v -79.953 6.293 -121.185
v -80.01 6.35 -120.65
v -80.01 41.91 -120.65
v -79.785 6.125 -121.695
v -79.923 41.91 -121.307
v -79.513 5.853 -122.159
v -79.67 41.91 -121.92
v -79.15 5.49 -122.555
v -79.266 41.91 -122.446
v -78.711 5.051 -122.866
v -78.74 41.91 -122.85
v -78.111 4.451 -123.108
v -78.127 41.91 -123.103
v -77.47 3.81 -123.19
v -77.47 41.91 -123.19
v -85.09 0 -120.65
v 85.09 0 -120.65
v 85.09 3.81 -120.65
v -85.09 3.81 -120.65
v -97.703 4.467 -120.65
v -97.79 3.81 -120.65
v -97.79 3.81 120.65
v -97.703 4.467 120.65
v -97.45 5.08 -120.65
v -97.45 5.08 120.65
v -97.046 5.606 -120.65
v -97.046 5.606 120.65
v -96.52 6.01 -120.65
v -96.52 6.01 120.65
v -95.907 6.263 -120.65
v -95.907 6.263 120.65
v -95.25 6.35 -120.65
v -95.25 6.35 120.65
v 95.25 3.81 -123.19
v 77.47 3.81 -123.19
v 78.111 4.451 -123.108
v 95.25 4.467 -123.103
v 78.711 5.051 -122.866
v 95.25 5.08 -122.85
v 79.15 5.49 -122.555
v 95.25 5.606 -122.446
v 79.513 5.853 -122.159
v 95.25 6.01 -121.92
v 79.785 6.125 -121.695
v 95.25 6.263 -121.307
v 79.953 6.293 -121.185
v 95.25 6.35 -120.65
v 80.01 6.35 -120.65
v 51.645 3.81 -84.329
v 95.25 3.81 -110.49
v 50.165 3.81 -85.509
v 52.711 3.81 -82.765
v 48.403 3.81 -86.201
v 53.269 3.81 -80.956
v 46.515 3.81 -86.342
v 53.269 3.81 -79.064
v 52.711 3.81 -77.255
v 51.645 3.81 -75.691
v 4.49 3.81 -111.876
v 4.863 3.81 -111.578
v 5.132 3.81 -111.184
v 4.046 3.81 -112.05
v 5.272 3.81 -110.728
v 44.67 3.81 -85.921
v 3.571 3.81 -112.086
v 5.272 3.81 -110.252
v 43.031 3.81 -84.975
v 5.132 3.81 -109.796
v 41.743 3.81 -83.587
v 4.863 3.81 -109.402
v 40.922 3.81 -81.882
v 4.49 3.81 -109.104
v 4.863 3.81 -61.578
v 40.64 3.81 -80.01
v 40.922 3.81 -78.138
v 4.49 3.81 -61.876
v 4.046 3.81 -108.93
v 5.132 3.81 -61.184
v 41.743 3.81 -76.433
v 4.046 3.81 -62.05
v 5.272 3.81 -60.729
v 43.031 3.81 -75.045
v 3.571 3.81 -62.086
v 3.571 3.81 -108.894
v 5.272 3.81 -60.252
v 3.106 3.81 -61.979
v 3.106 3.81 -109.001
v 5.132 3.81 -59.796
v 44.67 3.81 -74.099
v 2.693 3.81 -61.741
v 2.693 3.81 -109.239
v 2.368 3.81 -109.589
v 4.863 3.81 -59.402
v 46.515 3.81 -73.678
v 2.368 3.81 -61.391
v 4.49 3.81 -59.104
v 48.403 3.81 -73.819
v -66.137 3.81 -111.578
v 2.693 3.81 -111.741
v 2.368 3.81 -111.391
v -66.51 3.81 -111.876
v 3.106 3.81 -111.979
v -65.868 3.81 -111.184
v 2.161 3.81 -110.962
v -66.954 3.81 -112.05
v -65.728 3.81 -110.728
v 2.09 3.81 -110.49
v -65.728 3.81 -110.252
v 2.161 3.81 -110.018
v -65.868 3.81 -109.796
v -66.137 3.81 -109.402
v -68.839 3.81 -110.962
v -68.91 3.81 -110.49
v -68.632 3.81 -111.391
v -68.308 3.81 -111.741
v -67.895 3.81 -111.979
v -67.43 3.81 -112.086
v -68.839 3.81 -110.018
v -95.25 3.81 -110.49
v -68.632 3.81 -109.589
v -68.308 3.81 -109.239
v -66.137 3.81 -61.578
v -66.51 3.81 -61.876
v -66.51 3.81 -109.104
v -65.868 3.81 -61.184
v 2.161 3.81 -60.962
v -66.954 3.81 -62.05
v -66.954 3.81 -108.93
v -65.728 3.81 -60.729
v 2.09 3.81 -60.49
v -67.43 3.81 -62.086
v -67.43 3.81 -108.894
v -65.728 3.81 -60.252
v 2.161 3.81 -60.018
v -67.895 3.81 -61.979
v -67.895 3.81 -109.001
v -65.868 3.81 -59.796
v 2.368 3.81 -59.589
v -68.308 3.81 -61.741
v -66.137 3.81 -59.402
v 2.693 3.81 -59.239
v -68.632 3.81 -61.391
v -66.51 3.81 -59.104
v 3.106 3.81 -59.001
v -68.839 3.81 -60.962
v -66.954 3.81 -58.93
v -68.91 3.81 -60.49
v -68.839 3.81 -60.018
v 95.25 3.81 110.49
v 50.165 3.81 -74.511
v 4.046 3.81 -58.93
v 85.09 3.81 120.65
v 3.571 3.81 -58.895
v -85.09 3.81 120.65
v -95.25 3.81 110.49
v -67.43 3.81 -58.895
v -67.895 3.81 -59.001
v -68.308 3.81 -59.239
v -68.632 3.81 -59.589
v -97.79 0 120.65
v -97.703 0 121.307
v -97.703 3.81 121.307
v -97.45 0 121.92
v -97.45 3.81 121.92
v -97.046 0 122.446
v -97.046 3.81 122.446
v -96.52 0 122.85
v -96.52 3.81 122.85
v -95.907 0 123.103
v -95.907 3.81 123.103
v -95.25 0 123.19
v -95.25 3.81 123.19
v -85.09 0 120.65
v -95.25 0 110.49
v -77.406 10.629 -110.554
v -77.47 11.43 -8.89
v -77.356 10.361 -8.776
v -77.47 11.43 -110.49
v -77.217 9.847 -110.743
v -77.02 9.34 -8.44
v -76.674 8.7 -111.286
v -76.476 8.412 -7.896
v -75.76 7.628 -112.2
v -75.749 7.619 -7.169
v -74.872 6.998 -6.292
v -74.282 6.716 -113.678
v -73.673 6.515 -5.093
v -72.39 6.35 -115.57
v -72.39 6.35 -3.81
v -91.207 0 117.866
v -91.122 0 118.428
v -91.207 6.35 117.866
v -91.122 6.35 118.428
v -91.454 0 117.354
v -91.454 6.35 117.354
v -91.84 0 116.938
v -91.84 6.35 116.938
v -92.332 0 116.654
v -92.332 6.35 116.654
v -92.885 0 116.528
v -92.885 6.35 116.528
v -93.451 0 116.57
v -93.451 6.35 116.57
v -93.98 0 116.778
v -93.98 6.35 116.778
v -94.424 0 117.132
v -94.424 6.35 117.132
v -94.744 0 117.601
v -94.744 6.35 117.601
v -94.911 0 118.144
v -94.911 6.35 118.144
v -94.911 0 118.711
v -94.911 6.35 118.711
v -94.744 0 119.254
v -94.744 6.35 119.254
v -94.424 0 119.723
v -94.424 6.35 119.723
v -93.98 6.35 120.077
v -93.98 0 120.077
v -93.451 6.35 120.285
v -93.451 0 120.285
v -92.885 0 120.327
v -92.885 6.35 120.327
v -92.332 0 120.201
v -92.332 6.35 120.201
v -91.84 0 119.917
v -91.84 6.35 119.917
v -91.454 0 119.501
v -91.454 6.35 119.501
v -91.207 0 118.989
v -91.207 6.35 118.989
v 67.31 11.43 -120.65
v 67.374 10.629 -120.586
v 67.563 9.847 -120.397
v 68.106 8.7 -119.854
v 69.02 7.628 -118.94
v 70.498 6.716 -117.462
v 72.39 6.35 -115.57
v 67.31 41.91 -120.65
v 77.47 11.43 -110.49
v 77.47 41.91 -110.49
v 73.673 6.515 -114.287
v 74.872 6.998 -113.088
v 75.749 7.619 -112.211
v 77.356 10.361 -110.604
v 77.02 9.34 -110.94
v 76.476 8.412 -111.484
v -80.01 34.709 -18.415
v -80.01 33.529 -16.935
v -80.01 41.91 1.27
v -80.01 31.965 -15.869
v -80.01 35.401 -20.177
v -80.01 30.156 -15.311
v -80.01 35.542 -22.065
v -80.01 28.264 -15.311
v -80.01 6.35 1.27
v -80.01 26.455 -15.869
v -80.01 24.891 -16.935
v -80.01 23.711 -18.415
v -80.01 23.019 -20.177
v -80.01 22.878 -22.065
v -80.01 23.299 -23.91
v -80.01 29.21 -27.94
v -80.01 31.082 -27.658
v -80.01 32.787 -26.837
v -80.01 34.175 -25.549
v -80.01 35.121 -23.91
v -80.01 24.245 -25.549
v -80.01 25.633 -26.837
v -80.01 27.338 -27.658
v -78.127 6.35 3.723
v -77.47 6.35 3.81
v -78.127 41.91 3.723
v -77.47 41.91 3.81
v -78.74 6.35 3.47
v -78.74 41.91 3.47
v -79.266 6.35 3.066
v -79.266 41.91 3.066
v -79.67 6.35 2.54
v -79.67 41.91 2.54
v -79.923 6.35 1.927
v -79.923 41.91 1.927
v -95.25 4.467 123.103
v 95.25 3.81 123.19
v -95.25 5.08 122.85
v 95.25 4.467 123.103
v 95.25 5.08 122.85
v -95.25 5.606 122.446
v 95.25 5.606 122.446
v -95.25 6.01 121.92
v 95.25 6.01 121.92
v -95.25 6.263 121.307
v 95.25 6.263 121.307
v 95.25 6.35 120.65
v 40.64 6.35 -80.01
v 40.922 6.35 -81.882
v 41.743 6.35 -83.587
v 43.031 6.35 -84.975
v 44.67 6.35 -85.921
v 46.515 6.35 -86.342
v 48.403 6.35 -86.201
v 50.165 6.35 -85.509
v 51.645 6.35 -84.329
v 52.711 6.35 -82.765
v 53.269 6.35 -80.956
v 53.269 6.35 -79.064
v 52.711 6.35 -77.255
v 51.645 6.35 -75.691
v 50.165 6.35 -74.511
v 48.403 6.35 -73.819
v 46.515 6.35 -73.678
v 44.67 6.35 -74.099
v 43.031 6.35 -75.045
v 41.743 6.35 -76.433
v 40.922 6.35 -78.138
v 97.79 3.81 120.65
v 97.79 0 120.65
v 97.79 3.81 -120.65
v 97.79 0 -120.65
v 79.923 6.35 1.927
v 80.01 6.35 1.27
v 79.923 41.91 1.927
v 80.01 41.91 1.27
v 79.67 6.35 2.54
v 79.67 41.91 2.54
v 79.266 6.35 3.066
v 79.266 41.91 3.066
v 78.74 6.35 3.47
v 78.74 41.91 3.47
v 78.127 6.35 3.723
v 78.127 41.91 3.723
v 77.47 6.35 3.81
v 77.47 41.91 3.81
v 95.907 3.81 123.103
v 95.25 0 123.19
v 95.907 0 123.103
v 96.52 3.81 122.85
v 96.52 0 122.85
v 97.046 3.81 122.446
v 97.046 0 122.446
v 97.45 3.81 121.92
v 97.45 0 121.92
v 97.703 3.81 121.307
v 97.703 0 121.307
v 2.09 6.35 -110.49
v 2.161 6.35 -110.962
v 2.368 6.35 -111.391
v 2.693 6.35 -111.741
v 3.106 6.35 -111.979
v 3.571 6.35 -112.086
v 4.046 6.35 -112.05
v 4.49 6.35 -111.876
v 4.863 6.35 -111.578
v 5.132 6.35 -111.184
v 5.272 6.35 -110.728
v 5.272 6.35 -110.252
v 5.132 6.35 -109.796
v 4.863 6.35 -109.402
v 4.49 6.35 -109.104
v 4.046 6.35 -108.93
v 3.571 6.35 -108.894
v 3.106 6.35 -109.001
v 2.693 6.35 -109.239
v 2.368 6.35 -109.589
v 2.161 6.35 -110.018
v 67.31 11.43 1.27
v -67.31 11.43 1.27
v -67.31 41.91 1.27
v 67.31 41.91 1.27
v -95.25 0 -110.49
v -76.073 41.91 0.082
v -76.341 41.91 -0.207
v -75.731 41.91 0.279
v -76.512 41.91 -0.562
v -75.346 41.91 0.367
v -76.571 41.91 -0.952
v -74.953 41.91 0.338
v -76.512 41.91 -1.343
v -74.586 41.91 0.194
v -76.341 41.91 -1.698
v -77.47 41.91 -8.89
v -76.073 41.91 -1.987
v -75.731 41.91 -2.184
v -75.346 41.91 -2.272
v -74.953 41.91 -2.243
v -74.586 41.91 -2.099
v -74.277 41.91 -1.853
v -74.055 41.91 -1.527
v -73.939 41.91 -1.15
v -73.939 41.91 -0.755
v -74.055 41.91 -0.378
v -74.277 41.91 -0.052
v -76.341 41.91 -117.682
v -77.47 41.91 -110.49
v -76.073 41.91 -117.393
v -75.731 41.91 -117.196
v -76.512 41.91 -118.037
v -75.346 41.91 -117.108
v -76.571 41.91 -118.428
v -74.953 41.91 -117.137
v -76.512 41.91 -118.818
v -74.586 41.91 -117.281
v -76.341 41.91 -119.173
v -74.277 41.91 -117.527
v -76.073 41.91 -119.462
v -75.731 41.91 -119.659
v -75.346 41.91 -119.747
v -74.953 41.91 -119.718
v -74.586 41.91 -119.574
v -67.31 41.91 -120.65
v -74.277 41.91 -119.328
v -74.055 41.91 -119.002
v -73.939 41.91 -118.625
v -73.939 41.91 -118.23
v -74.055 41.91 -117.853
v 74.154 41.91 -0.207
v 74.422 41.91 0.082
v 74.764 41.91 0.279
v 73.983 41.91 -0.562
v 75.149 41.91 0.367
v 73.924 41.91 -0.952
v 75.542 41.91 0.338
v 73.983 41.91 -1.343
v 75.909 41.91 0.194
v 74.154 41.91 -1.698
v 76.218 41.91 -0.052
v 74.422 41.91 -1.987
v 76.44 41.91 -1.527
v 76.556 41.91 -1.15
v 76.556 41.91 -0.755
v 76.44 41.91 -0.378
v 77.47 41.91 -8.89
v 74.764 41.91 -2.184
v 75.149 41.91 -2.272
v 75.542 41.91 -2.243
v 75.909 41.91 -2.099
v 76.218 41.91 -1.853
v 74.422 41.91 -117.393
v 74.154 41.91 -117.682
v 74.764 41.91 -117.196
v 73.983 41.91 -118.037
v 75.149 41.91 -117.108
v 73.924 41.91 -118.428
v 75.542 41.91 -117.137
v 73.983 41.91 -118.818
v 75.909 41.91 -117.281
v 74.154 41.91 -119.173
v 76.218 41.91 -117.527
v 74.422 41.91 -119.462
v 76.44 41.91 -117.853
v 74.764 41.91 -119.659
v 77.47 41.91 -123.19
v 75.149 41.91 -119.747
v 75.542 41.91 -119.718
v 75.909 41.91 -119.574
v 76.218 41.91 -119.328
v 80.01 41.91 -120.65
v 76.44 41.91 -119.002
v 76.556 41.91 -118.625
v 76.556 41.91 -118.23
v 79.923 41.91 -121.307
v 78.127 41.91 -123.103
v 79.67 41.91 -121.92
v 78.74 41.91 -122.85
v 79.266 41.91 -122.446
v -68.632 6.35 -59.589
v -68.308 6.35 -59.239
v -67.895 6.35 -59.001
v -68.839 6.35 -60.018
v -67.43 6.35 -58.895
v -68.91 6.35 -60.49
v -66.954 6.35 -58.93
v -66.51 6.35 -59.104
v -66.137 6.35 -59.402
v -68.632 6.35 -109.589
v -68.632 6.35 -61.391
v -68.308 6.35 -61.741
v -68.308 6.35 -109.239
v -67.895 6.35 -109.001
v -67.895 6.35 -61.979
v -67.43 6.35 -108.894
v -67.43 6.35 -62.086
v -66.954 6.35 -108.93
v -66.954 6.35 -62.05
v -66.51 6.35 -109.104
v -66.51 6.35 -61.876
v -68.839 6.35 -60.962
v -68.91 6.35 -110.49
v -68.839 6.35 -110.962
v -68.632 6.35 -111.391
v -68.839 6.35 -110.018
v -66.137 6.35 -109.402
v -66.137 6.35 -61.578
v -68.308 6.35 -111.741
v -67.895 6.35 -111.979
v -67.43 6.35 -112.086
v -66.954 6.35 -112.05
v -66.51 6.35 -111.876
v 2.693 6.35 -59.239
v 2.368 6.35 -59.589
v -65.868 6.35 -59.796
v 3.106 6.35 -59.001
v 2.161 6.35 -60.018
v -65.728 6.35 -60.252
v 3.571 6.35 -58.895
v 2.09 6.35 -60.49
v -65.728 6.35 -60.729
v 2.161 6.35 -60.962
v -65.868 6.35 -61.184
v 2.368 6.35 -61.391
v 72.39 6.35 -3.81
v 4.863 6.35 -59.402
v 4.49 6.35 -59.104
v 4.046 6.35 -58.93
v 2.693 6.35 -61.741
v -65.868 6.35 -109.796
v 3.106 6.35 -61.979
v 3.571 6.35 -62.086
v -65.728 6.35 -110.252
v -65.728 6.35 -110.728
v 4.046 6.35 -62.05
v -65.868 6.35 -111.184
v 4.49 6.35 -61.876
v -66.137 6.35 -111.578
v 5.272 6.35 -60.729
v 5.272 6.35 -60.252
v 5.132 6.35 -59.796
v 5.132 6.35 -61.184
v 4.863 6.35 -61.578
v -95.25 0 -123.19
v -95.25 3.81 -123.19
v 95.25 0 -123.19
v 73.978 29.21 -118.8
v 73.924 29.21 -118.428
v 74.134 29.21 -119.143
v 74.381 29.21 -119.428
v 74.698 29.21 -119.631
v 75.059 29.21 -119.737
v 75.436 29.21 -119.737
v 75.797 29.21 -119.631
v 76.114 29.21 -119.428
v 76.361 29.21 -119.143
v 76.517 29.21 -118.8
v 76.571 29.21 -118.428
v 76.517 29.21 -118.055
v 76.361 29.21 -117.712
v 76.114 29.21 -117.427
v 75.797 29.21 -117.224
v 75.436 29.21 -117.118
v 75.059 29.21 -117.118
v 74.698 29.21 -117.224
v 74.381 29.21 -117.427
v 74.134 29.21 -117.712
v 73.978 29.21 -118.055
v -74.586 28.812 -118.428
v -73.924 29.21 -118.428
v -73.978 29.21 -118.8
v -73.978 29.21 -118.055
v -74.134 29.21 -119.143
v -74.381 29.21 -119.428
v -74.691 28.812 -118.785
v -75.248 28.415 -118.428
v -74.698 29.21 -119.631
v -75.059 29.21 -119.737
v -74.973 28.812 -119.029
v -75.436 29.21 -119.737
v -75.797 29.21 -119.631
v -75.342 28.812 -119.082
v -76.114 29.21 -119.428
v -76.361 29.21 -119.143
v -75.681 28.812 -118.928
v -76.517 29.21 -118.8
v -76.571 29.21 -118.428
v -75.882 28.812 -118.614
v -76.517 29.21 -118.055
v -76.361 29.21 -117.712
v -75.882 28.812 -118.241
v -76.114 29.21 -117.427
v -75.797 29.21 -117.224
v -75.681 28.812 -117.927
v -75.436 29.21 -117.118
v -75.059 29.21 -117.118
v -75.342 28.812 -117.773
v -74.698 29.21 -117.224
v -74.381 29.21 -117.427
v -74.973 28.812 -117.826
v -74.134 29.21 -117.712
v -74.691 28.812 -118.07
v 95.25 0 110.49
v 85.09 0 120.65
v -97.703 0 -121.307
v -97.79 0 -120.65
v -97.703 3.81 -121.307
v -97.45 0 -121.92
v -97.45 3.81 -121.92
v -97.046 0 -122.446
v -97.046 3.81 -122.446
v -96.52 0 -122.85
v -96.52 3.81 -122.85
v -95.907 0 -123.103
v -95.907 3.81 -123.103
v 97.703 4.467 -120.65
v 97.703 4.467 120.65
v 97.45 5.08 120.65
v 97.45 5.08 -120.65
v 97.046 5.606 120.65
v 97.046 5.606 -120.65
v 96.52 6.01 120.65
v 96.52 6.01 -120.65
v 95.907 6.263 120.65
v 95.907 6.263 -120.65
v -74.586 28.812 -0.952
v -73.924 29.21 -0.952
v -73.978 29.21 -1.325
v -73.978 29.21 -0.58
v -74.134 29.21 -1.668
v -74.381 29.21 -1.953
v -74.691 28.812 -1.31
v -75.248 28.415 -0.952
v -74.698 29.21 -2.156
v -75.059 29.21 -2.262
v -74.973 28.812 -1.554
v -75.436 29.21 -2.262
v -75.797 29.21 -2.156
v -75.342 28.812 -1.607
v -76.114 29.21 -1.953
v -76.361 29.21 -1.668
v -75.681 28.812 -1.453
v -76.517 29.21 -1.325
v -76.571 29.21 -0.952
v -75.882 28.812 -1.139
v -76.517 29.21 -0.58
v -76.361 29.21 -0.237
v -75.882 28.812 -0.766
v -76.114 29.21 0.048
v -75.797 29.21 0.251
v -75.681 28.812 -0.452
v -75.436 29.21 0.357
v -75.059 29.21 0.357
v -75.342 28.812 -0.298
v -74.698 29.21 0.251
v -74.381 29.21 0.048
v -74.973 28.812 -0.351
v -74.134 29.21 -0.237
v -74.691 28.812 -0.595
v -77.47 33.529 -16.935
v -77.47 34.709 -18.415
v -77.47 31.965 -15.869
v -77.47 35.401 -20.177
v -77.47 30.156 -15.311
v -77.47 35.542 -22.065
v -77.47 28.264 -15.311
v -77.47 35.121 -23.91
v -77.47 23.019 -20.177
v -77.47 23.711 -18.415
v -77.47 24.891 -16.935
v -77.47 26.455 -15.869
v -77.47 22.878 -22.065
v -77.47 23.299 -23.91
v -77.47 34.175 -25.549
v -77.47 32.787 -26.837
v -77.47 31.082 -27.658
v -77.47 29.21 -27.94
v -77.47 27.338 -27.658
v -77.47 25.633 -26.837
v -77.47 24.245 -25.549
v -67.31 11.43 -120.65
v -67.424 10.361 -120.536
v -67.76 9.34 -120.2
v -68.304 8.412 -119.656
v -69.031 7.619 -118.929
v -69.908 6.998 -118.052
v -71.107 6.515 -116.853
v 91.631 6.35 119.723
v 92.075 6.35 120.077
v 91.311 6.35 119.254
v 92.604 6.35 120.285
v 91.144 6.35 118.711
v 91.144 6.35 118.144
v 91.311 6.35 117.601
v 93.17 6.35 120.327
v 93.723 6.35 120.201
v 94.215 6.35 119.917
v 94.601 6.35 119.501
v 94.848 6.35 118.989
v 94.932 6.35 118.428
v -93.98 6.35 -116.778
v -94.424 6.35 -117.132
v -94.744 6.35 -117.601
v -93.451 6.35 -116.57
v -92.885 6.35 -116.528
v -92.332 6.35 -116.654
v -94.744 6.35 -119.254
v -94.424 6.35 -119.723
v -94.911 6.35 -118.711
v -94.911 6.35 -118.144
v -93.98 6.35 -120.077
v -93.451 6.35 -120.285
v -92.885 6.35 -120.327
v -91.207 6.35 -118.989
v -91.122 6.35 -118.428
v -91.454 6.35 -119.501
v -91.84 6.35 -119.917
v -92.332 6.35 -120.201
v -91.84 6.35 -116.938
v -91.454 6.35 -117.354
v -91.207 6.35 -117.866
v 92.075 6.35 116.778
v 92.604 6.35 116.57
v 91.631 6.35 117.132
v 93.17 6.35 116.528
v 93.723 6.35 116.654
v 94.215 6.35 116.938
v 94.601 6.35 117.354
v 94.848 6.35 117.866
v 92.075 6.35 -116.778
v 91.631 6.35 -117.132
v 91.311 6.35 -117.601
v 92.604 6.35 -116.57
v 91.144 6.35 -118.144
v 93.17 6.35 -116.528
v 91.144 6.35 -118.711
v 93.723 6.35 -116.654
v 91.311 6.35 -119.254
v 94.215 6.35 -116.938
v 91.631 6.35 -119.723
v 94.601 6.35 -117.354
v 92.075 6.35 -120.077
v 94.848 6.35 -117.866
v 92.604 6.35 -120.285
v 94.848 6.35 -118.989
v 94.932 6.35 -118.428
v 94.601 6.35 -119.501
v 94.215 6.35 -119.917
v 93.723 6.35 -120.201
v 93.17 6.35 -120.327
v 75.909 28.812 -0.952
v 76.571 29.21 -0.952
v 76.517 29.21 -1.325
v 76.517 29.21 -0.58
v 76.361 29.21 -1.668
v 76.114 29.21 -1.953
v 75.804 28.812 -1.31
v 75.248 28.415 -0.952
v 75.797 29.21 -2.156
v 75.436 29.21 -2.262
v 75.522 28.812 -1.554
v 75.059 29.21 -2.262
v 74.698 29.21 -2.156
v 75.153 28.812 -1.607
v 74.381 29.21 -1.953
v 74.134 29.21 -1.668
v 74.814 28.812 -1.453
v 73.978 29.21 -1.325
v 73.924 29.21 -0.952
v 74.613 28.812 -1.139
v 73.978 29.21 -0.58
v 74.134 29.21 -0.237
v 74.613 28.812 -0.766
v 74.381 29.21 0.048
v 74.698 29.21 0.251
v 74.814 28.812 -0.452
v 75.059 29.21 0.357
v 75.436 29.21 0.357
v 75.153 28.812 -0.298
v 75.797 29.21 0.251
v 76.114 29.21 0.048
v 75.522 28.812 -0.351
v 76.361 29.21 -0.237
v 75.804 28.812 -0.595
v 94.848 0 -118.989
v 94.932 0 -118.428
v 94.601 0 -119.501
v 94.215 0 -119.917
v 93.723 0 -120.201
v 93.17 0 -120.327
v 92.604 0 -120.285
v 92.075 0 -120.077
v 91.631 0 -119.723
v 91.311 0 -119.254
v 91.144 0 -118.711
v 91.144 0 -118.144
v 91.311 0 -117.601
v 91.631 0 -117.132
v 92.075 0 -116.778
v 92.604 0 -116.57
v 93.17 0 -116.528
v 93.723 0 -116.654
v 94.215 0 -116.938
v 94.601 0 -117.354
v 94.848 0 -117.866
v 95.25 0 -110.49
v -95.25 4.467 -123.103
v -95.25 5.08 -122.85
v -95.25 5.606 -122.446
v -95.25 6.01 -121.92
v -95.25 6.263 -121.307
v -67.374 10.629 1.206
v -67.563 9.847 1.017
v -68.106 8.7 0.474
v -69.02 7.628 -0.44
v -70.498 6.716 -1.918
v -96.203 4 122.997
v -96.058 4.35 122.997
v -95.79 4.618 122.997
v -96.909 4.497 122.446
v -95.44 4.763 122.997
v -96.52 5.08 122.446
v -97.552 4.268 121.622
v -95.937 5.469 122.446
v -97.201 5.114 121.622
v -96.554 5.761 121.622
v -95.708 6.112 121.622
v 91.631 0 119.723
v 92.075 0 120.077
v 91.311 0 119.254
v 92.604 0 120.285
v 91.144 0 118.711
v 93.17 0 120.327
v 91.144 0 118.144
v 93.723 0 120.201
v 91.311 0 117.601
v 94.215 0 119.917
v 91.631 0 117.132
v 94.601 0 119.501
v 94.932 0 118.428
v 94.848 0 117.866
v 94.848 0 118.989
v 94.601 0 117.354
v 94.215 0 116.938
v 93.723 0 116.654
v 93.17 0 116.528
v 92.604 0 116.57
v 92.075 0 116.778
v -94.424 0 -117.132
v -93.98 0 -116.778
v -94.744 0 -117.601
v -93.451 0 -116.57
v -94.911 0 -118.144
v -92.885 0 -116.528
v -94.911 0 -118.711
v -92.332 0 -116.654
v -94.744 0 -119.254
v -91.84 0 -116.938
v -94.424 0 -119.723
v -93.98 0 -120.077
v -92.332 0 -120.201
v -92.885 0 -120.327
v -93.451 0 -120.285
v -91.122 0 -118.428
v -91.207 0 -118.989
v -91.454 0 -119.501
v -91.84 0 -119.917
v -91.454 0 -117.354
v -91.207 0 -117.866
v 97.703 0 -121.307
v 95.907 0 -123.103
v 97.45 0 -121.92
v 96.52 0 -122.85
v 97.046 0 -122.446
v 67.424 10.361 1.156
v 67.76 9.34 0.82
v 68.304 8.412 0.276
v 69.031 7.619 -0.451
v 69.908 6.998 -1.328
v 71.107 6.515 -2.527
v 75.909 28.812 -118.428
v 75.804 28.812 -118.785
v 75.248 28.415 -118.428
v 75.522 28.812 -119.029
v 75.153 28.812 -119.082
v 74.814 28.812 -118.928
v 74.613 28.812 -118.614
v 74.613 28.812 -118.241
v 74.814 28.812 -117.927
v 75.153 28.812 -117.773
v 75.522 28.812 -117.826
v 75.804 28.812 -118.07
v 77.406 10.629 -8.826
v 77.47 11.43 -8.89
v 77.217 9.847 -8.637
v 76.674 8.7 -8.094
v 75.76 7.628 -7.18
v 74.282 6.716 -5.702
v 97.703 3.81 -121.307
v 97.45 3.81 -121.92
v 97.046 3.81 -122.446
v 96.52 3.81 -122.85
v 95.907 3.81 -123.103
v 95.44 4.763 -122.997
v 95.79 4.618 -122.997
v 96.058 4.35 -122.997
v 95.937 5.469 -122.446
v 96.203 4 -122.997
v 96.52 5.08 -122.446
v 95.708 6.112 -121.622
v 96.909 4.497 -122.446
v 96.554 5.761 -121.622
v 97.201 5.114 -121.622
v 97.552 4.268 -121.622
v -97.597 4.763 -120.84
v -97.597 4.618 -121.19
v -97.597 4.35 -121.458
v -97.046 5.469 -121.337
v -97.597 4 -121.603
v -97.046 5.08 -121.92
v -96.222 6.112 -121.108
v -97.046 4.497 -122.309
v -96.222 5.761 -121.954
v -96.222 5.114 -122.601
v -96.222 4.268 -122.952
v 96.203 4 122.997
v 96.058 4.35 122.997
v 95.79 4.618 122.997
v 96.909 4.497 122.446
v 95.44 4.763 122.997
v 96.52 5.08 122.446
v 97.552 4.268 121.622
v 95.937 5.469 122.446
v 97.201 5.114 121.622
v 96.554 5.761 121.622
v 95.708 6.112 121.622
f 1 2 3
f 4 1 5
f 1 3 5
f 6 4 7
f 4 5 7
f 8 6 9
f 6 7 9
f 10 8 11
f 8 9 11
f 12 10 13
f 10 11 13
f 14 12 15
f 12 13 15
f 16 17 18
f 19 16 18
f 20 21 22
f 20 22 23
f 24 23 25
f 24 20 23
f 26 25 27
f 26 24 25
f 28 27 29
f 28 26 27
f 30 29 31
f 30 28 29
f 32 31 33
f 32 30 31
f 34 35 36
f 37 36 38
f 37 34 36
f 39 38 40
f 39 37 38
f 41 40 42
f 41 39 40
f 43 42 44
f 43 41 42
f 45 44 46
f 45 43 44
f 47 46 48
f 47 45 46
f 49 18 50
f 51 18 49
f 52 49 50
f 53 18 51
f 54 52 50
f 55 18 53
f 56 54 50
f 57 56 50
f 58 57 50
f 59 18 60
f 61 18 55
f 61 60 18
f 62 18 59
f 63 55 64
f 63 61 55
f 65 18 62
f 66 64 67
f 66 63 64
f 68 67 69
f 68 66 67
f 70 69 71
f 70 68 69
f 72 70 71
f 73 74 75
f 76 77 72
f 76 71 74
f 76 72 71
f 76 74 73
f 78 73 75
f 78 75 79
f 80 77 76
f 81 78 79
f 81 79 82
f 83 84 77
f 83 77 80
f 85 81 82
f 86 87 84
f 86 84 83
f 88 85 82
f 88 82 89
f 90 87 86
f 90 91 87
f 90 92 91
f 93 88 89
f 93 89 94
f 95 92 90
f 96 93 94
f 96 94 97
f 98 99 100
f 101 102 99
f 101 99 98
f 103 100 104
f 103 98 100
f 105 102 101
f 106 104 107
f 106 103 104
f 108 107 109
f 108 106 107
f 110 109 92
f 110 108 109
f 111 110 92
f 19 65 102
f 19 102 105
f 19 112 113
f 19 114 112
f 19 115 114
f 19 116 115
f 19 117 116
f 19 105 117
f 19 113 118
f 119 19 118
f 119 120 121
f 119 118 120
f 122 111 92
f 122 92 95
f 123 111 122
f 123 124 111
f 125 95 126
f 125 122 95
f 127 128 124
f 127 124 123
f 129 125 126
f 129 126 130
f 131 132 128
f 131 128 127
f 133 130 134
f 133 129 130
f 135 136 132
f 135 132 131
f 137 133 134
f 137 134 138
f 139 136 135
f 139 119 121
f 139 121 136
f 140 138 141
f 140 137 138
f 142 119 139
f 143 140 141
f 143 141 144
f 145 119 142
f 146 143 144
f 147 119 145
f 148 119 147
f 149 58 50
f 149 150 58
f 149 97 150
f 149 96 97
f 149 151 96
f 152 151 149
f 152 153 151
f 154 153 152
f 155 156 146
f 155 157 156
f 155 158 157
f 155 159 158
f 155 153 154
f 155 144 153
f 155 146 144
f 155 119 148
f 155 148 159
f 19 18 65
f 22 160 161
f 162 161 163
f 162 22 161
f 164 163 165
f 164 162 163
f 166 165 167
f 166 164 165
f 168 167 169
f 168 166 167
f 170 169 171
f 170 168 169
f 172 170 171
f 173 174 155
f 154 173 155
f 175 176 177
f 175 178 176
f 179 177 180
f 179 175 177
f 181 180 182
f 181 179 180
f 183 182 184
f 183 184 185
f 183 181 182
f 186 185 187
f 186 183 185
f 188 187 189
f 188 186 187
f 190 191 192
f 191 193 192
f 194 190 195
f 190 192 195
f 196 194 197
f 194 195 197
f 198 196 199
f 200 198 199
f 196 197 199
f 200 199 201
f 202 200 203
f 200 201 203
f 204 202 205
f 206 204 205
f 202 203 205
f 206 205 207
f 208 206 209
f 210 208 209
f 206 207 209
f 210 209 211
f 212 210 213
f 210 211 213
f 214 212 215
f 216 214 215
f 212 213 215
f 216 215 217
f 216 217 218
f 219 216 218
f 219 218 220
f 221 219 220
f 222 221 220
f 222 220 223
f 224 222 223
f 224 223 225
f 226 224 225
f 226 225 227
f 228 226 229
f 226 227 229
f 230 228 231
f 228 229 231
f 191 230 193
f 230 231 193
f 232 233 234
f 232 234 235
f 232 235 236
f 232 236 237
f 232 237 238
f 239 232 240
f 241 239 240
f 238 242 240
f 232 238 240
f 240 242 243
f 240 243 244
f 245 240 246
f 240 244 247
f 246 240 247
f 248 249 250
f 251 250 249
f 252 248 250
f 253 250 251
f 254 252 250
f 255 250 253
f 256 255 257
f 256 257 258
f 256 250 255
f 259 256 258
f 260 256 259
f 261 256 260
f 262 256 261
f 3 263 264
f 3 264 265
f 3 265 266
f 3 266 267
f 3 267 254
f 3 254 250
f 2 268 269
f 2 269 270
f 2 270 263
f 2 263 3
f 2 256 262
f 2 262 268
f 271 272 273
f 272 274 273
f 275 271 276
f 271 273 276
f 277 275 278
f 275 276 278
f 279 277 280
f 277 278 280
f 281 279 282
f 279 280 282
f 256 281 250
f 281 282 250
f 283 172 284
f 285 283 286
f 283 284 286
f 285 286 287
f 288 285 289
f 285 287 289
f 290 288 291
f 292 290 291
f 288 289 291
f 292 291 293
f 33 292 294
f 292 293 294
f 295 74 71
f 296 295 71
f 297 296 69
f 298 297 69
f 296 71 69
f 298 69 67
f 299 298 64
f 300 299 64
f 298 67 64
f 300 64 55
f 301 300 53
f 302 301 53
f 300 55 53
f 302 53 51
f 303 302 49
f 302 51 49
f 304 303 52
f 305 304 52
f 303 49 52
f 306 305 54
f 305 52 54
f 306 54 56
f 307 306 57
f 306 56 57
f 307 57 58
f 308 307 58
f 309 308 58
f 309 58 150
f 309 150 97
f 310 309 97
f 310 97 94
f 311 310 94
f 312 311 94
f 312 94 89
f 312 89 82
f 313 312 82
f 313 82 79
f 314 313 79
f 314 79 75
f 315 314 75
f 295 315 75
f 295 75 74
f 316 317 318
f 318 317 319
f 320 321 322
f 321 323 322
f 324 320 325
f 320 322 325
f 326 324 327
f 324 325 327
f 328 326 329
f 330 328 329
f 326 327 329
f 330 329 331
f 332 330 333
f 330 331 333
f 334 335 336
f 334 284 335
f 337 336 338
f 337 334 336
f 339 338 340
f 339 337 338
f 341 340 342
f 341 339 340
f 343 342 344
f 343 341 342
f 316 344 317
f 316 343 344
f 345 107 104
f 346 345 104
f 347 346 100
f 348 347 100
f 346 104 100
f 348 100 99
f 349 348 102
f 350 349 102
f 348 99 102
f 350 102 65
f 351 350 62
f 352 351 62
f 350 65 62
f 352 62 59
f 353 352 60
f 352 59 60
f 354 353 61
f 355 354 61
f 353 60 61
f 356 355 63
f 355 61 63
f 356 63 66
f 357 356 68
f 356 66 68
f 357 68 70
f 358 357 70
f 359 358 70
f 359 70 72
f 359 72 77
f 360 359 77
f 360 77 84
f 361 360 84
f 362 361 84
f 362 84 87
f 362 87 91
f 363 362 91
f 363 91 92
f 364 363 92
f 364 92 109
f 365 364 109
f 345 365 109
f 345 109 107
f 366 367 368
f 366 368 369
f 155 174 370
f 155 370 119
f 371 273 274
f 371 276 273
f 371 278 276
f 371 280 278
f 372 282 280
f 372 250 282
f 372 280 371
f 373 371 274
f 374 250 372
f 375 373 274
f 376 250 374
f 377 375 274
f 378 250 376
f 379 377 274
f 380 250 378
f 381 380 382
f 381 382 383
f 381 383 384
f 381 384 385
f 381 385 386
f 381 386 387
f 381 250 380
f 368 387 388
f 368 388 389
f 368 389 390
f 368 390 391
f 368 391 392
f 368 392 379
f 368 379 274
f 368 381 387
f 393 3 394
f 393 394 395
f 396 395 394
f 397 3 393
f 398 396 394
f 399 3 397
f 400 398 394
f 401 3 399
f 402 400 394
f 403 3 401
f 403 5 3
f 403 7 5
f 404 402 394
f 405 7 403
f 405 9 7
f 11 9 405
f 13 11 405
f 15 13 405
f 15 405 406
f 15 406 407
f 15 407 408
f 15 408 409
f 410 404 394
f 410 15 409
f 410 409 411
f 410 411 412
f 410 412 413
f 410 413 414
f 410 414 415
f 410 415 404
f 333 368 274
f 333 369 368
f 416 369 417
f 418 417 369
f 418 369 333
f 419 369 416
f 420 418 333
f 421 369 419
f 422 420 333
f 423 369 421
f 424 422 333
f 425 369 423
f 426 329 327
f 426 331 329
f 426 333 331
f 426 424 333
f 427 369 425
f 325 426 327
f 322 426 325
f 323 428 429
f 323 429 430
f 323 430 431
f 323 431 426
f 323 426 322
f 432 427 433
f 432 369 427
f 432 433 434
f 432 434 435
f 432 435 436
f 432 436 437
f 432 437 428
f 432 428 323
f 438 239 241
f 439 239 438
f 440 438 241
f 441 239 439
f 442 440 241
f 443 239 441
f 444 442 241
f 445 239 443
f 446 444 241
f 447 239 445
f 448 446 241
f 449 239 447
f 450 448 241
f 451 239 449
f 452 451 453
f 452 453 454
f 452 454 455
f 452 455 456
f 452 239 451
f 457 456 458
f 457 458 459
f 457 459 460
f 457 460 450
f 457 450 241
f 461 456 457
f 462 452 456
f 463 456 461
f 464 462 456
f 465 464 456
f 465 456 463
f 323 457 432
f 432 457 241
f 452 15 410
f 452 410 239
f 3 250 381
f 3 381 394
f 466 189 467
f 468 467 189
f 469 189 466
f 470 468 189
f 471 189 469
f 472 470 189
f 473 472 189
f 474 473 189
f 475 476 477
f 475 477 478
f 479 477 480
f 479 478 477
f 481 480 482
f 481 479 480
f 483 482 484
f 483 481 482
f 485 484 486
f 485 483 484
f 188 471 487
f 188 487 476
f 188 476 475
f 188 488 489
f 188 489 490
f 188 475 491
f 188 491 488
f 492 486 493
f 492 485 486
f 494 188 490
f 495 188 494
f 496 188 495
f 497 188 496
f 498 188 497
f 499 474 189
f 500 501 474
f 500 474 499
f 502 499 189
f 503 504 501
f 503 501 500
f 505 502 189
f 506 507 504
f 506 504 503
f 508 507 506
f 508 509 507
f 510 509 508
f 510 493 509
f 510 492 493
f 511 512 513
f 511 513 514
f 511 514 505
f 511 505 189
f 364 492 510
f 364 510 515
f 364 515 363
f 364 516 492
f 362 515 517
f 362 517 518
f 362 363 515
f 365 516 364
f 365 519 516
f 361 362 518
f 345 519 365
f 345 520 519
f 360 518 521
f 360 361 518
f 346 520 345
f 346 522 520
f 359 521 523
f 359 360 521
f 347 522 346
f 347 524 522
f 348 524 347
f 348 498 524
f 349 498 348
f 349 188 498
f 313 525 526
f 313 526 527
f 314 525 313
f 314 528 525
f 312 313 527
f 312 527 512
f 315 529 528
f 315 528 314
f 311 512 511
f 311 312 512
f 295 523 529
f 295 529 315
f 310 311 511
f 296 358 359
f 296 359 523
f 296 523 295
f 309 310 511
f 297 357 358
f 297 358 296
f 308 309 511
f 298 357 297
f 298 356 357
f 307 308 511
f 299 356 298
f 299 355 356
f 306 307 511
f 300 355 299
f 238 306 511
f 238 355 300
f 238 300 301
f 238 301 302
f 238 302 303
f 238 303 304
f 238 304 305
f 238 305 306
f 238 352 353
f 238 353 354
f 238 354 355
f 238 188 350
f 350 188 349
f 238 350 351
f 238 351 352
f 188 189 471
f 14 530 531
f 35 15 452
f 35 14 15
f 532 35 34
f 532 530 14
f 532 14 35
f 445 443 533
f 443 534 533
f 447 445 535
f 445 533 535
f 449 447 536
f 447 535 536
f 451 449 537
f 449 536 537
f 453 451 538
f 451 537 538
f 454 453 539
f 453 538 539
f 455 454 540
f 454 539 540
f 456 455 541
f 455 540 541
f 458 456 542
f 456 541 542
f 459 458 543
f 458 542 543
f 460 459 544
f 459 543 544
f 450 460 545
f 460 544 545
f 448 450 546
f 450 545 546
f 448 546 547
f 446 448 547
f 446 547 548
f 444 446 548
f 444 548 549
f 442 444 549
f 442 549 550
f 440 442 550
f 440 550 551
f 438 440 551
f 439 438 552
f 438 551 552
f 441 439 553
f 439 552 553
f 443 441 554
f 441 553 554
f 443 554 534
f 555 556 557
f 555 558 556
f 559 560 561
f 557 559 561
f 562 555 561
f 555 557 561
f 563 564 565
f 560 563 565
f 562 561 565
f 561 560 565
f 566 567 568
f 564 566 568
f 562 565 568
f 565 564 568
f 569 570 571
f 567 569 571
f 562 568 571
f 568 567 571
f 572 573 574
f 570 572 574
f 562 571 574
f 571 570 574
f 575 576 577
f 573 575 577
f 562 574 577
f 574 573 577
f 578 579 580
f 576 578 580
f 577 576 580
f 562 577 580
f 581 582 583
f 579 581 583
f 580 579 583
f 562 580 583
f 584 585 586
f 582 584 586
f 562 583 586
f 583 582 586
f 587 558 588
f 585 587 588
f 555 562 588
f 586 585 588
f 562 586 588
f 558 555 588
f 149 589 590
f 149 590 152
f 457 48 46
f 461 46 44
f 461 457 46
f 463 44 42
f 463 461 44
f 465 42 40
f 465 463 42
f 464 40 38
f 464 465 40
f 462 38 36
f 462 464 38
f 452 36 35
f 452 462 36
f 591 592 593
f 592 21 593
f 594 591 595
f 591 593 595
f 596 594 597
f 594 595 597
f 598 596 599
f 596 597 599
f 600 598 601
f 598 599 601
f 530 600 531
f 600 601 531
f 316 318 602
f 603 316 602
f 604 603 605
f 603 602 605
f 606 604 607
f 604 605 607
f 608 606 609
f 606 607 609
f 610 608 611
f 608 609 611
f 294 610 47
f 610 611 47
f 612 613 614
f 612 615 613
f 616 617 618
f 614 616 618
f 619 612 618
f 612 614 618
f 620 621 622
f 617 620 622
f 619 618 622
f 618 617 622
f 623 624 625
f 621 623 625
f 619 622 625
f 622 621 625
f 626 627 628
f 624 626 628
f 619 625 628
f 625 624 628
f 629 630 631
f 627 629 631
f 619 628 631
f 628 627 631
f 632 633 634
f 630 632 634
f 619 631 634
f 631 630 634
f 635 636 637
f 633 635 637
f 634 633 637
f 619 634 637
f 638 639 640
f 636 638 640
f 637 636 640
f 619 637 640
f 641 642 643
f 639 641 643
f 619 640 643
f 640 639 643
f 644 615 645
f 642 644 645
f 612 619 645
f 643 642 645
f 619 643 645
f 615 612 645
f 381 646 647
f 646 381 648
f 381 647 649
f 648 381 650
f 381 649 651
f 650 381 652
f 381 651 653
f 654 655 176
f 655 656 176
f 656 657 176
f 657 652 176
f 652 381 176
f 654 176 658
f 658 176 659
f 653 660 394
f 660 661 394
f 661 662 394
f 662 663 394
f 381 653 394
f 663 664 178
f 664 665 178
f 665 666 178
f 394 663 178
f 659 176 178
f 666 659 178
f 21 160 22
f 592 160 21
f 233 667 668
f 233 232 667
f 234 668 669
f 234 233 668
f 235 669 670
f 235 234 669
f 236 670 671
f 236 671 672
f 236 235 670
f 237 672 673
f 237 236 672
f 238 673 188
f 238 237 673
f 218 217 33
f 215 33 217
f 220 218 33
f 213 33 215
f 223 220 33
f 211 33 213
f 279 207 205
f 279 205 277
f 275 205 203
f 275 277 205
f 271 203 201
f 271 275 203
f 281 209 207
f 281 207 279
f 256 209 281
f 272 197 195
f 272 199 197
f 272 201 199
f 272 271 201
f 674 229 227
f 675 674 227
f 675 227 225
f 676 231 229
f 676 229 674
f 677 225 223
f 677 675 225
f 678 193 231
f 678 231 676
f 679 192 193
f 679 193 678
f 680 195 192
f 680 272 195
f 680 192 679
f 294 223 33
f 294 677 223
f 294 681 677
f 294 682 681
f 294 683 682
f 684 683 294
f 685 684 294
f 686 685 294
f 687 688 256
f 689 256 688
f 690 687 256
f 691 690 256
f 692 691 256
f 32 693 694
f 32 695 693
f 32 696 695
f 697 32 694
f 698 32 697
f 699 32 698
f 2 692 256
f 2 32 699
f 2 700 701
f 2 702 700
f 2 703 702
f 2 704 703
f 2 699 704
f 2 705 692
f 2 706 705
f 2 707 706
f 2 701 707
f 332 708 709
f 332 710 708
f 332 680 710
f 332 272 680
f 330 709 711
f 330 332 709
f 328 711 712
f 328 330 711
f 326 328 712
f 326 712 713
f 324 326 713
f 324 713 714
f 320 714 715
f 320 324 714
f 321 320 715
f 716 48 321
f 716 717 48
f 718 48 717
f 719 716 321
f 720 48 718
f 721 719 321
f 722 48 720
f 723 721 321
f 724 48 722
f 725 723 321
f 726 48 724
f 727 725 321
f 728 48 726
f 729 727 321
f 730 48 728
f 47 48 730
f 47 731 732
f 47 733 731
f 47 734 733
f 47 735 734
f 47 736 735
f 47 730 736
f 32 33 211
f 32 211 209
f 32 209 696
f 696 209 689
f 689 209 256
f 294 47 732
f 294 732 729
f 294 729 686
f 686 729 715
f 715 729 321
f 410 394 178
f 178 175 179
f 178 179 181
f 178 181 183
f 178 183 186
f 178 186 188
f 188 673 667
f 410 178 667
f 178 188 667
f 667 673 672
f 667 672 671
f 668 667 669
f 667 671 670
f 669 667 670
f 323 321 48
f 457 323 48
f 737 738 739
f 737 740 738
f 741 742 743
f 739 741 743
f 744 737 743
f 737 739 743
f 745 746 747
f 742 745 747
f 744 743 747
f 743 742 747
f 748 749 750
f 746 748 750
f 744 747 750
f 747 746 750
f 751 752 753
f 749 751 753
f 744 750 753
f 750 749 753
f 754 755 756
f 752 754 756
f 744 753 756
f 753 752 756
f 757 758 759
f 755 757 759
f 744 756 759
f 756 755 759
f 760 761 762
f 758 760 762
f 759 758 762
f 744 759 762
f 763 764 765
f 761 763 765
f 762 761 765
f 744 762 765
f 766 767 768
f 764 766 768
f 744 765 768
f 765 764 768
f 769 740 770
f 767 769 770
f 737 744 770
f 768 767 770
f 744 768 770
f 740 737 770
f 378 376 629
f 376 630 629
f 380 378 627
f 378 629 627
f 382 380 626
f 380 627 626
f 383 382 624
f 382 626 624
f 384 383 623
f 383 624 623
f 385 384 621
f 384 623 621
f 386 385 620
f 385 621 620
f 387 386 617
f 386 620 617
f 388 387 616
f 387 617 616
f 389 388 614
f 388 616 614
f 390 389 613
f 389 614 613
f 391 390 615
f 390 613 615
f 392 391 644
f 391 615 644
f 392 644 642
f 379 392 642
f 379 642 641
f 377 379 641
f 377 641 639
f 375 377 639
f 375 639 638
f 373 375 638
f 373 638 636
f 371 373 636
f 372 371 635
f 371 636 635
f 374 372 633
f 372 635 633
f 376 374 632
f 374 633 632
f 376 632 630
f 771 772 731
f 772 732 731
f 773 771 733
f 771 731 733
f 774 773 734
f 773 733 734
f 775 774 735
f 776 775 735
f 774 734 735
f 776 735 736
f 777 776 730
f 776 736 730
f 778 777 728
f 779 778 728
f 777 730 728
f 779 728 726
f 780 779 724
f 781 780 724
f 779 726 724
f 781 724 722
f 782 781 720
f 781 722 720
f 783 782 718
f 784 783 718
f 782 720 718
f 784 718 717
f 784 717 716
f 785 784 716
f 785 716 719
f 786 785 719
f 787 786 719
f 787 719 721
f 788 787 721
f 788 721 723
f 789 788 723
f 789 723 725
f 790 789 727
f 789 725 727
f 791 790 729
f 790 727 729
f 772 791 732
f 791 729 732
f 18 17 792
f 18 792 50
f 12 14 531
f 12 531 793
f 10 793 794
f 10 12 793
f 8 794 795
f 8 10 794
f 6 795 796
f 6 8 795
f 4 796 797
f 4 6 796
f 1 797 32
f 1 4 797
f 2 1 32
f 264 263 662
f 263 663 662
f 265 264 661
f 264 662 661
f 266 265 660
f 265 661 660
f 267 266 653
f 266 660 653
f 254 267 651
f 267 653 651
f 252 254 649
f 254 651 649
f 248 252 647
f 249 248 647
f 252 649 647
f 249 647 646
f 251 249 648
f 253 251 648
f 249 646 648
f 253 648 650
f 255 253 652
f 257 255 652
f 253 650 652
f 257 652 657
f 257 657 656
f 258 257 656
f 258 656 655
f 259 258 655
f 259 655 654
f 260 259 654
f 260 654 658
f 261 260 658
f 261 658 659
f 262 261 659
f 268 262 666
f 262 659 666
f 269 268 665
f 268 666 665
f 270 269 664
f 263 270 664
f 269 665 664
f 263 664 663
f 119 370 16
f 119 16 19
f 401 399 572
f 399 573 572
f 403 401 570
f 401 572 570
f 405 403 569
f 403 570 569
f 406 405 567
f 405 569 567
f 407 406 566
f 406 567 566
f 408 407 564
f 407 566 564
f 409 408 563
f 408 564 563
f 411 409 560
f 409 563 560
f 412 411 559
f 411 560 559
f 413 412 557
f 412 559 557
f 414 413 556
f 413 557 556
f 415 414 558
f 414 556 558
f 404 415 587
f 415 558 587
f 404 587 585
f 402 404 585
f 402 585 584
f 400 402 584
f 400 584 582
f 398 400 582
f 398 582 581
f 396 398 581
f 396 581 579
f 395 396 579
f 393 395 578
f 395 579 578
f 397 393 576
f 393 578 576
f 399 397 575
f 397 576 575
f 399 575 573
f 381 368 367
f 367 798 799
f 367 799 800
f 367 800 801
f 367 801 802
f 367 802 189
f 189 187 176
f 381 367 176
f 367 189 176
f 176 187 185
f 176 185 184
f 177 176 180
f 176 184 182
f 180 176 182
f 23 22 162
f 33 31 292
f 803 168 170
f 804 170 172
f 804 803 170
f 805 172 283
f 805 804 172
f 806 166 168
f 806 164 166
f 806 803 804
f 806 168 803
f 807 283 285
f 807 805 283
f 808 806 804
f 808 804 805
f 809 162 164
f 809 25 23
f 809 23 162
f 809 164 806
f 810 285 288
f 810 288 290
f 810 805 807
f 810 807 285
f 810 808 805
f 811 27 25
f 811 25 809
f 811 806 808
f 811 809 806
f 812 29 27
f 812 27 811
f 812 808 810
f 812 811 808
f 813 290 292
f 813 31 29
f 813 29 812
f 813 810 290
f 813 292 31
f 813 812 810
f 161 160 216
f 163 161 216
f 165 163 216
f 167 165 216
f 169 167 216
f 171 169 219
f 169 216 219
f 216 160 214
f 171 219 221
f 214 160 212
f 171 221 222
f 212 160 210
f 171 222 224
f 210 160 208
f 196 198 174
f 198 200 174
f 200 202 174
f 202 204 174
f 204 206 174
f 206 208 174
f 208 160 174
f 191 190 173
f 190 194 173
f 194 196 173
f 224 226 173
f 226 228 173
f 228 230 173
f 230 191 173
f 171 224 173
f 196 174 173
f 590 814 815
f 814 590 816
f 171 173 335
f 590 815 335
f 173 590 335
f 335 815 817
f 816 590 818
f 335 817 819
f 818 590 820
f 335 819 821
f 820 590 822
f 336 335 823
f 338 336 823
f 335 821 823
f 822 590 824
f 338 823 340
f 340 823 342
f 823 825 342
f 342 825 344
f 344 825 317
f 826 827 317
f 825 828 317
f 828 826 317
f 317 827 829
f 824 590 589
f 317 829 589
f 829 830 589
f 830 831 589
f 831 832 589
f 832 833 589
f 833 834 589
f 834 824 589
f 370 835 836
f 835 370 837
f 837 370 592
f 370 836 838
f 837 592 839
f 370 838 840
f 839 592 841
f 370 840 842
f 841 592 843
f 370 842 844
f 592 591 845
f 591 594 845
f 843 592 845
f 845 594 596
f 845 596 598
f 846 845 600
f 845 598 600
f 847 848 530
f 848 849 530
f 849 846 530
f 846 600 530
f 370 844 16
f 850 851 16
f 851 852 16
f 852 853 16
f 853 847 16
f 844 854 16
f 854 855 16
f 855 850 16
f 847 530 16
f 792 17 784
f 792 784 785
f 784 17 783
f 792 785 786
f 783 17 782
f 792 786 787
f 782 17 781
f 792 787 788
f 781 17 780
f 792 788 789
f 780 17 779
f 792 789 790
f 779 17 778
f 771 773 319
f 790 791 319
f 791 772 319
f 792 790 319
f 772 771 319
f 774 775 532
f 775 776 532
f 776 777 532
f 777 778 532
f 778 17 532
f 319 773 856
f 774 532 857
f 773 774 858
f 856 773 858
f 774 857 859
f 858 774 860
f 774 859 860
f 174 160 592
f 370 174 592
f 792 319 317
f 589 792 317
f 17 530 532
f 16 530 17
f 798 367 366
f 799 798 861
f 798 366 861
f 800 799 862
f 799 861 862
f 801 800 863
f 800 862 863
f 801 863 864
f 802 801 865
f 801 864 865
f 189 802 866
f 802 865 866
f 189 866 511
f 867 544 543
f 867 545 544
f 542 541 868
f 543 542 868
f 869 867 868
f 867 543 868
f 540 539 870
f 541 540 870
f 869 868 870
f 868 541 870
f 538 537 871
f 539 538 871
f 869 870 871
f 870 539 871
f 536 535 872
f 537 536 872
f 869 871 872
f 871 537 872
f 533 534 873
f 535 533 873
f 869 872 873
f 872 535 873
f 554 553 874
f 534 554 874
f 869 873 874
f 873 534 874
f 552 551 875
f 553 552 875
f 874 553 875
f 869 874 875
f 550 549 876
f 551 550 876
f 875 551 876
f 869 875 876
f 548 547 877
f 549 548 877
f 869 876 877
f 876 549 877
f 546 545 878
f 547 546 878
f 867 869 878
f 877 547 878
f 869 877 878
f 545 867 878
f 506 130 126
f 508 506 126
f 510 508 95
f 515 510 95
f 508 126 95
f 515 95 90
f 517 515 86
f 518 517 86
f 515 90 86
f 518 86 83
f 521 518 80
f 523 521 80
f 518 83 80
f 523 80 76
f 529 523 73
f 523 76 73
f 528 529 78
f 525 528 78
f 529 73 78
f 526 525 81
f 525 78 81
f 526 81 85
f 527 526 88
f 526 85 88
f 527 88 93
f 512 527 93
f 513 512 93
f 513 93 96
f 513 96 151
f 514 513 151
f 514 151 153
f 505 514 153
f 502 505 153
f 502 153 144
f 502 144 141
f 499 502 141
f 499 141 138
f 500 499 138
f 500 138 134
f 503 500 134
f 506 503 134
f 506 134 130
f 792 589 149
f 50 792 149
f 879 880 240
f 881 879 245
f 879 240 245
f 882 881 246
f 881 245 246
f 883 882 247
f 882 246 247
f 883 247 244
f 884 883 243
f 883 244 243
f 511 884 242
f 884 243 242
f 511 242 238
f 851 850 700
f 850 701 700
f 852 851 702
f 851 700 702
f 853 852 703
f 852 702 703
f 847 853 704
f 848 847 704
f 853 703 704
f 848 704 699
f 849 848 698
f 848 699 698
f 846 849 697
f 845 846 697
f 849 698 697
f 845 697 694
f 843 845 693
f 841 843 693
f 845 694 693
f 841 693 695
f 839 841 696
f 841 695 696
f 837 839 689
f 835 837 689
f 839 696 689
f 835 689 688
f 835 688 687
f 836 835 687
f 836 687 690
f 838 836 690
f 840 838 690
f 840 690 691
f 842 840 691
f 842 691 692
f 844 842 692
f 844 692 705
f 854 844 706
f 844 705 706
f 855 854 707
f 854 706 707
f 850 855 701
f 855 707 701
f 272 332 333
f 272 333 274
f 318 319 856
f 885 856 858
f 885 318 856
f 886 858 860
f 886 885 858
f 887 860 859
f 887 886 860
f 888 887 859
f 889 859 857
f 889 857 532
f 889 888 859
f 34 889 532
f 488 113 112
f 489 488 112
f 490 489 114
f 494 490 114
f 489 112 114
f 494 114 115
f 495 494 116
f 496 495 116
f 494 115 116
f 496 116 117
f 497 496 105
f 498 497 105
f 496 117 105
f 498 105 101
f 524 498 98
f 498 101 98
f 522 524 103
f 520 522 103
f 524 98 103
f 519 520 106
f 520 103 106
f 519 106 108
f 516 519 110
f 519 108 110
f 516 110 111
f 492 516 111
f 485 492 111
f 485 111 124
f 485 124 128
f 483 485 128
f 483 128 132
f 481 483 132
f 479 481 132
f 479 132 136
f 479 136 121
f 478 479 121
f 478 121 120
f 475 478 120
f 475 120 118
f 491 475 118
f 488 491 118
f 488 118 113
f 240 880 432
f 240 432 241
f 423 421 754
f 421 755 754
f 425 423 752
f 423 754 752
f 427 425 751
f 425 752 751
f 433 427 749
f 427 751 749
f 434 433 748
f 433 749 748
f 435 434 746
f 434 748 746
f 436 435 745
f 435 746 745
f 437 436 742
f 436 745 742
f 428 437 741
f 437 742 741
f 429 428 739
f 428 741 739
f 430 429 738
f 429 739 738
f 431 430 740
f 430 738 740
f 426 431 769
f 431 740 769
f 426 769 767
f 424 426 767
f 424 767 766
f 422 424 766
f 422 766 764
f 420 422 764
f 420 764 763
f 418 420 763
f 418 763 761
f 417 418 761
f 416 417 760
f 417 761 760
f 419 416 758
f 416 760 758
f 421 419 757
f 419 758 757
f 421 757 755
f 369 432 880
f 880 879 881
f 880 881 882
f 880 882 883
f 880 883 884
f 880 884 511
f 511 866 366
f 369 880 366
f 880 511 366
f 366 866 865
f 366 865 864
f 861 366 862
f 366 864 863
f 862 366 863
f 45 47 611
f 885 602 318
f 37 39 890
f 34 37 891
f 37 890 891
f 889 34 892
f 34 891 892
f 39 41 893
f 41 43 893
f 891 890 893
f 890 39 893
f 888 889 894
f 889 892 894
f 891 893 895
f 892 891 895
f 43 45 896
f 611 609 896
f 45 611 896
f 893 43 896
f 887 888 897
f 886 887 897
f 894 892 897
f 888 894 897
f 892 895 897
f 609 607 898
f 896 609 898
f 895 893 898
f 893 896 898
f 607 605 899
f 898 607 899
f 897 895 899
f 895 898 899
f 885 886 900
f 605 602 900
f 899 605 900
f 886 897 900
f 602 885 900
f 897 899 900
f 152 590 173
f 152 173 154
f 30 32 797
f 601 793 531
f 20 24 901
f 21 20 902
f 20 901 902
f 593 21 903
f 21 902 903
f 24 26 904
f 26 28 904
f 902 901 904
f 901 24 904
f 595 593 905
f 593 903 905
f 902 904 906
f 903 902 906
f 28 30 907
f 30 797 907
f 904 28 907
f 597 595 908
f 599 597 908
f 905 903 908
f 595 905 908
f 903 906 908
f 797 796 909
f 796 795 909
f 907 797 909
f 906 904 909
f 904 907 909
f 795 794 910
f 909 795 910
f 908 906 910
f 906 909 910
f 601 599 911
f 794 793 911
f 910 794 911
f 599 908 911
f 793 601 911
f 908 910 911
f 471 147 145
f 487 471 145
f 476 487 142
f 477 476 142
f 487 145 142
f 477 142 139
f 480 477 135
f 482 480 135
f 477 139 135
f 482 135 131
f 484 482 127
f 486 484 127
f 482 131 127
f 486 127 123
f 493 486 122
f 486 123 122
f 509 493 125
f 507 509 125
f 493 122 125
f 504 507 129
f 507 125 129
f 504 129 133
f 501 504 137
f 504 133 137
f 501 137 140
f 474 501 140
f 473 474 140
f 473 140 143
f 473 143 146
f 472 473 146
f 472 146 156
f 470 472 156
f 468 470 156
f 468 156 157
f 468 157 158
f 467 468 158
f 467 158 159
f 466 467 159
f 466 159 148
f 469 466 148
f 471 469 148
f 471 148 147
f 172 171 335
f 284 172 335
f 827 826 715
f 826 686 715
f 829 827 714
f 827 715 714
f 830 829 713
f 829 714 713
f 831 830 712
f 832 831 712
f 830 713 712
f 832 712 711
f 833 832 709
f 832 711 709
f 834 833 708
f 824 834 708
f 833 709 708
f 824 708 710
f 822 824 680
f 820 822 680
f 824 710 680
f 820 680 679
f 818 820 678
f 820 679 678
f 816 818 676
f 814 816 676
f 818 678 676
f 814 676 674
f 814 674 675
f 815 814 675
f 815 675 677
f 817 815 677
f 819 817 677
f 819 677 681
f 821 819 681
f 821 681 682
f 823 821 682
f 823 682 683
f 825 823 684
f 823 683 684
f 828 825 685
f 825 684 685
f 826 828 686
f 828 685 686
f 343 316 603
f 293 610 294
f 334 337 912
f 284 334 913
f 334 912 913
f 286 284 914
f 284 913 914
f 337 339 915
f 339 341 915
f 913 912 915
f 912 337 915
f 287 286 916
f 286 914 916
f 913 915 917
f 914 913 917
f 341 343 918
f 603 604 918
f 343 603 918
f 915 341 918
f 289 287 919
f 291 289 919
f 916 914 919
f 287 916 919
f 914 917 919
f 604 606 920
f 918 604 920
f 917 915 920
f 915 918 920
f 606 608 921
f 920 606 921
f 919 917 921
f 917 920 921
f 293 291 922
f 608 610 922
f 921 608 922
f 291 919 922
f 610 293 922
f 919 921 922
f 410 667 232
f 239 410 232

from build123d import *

# Parameters (mm, degrees)
SKETCH2_W                      = 195.58
SKETCH2_H                      = 246.38
BOSS_EXTRUDE1_DEPTH            = 6.35
FILLET1_R                      = 2.54
SHELL1_START                   = -95.25
SHELL1_OUTLINE_W               = 3.81
SHELL1_OUTLINE_H               = 241.3
SHELL1_DEPTH                   = 190.5
SKETCH3_W                      = 160.02
SKETCH3_H                      = 127
BOSS_EXTRUDE2_DEPTH            = 38.1
FILLET2_R                      = 2.54
SHELL2_START                   = 6.35
SHELL2_OUTLINE_W               = 154.94
SHELL2_OUTLINE_H               = 121.92
SHELL2_DEPTH                   = 35.56
FILLET3_R                      = 5.08
ARDUINO_MOUNT_HOLES_D          = 3.2
CHAMFER1_START                 = 5
CHAMFER1_DEPTH                 = 36.91
TOP_COVER_HOLES_D              = 2.64668
TOP_COVER_HOLES_DEPTH          = 12.7
TOP_COVER_HOLES_TIP            = 0.795142892
CHAMFER2_SIZE                  = 10.16
BOTTOM_COVER_HOLES_D           = 3.81
BOTTOM_COVER_HOLES_DEPTH       = 6.35
BOTTOM_COVER_HOLES_TIP         = 1.144639479
HOLE_FOR_WIRING_D              = 12.7
F_1_2_0_5000_DOWEL_HOLE2_D     = 12.7
F_1_2_0_5000_DOWEL_HOLE2_DEPTH = 2.54
F_1_2_0_5000_DOWEL_HOLE2_TIP   = 3.815464931


with BuildPart() as part:
    # Sketch2 → Boss-Extrude1 (new body)
    with BuildSketch(Plane(origin=(0, 0, 0), x_dir=(1, 0, 0), z_dir=(0, 1, 0))):
        Rectangle(SKETCH2_W, SKETCH2_H)
    extrude(amount=BOSS_EXTRUDE1_DEPTH)

    # Fillet1
    fillet1_edges = [part.edges().sort_by_distance(p)[0] for p in [
        (97.79, 6.35, 0),
        (0, 6.35, -123.19),
        (-97.79, 6.35, 0),
        (-97.79, 3.175, -123.19),
        (97.79, 3.175, -123.19),
        (97.79, 3.175, 123.19),
        (-97.79, 3.175, 123.19),
        (0, 6.35, 123.19),
    ]]
    fillet(fillet1_edges, radius=FILLET1_R)

    # Shell1: read off the stored shape, not the designer's step
    # Shell1 outline → Shell1 (cut)
    with BuildSketch(Plane.YZ.offset(SHELL1_START)):
        with Locations((1.905, 0)):
            Rectangle(SHELL1_OUTLINE_W, SHELL1_OUTLINE_H)
    extrude(amount=SHELL1_DEPTH, mode=Mode.SUBTRACT)

    # Sketch3 → Boss-Extrude2 (add)
    with BuildSketch(Plane(origin=(0, 3.81, 0), x_dir=(-1, 0, 0), z_dir=(0, -1, 0))):
        with Locations((0, 59.69)):
            Rectangle(SKETCH3_W, SKETCH3_H)
    extrude(amount=-BOSS_EXTRUDE2_DEPTH)

    # Fillet2
    fillet2_edges = [part.edges().sort_by_distance(p)[0] for p in [
        (80.01, 22.86, -123.19),
        (-80.01, 22.86, -123.19),
        (80.01, 24.13, 3.81),
        (-80.01, 24.13, 3.81),
    ]]
    fillet(fillet2_edges, radius=FILLET2_R)

    # Shell2: read off the stored shape, not the designer's step
    # Shell2 outline → Shell2 (cut)
    with BuildSketch(Plane(origin=(0, 0, 0), x_dir=(1, 0, 0), z_dir=(0, 1, 0)).offset(SHELL2_START)):
        with Locations((0, 59.69)):
            Rectangle(SHELL2_OUTLINE_W, SHELL2_OUTLINE_H)
    extrude(amount=SHELL2_DEPTH, mode=Mode.SUBTRACT)

    # Fillet3
    fillet3_edges = [part.edges().sort_by_distance(p)[0] for p in [
        (0, 6.35, -120.65),
        (77.47, 6.35, -59.69),
        (-77.47, 6.35, -59.69),
        (0, 6.35, 1.27),
    ]]
    fillet(fillet3_edges, radius=FILLET3_R)

    # Arduino Mount holes (through all)
    with Locations(Plane(origin=(0, 6.35, 0), x_dir=(1, 0, 0), z_dir=(0, 1, 0))):
        with Locations((3.690112, 110.49), (3.690112, 60.4901), (-67.31, 60.4901), (-67.31, 110.49)):
            Hole(ARDUINO_MOUNT_HOLES_D / 2)

    # Chamfer1: read off the stored shape, not the designer's step
    # Chamfer1 outline → Chamfer1 (add)
    with BuildSketch(Plane(origin=(0, 0, 0), x_dir=(1, 0, 0), z_dir=(0, 1, 0)).offset(CHAMFER1_START)):
        Polygon((-77.47, 110.49), (-67.31, 120.65), (-77.47, 120.65), align=None)
        Polygon((77.47, 120.65), (67.31, 120.65), (77.47, 110.49), align=None)
        Polygon((-67.31, -1.27), (-77.47, 8.89), (-77.47, -1.27), align=None)
        Polygon((77.47, -1.27), (77.47, 8.89), (67.31, -1.27), align=None)
    extrude(amount=CHAMFER1_DEPTH)

    # Top cover holes
    with Locations(Plane(origin=(0, 41.91, 0), x_dir=(1, 0, 0), z_dir=(0, 1, 0))):
        with Locations((75.2475, 0.9525), (-75.2475, 0.9525), (-75.2475, 118.4275), (75.2475, 118.4275)):
            Hole(TOP_COVER_HOLES_D / 2, depth=TOP_COVER_HOLES_DEPTH)
            with Locations((0, 0, -(TOP_COVER_HOLES_DEPTH + TOP_COVER_HOLES_TIP / 2))):  # 118° drill point
                Cone(0, TOP_COVER_HOLES_D / 2, TOP_COVER_HOLES_TIP, mode=Mode.SUBTRACT)

    # Chamfer2
    chamfer2_edges = [part.edges().sort_by_distance(p)[0] for p in [
        (-95.25, 1.905, -120.65),
        (-95.25, 1.905, 120.65),
        (95.25, 1.905, 120.65),
        (95.25, 1.905, -120.65),
    ]]
    chamfer(chamfer2_edges, length=CHAMFER2_SIZE)

    # Bottom cover holes
    with Locations(Plane(origin=(0, 0, 0), x_dir=(-1, 0, 0), z_dir=(0, -1, 0))):
        with Locations((-93.0275, 118.4275), (93.0275, 118.4275), (93.0275, -118.4275), (-93.0275, -118.4275)):
            Hole(BOTTOM_COVER_HOLES_D / 2, depth=BOTTOM_COVER_HOLES_DEPTH)
            with Locations((0, 0, -(BOTTOM_COVER_HOLES_DEPTH + BOTTOM_COVER_HOLES_TIP / 2))):  # 118° drill point
                Cone(0, BOTTOM_COVER_HOLES_D / 2, BOTTOM_COVER_HOLES_TIP, mode=Mode.SUBTRACT)

    # Hole for Wiring (through all)
    with Locations(Plane(origin=(0, 6.35, 0), x_dir=(1, 0, 0), z_dir=(0, 1, 0))):
        with Locations((46.99, 80.01)):
            Hole(HOLE_FOR_WIRING_D / 2)

    # 1/2 (0.5000) Dowel Hole2
    with Locations(Plane.ZY.offset(80.01)):
        with Locations((-21.59, 29.21)):
            Hole(F_1_2_0_5000_DOWEL_HOLE2_D / 2, depth=F_1_2_0_5000_DOWEL_HOLE2_DEPTH)
            with Locations((0, 0, -(F_1_2_0_5000_DOWEL_HOLE2_DEPTH + F_1_2_0_5000_DOWEL_HOLE2_TIP / 2))):  # 118° drill point
                Cone(0, F_1_2_0_5000_DOWEL_HOLE2_D / 2, F_1_2_0_5000_DOWEL_HOLE2_TIP, mode=Mode.SUBTRACT)


solid = part.part
